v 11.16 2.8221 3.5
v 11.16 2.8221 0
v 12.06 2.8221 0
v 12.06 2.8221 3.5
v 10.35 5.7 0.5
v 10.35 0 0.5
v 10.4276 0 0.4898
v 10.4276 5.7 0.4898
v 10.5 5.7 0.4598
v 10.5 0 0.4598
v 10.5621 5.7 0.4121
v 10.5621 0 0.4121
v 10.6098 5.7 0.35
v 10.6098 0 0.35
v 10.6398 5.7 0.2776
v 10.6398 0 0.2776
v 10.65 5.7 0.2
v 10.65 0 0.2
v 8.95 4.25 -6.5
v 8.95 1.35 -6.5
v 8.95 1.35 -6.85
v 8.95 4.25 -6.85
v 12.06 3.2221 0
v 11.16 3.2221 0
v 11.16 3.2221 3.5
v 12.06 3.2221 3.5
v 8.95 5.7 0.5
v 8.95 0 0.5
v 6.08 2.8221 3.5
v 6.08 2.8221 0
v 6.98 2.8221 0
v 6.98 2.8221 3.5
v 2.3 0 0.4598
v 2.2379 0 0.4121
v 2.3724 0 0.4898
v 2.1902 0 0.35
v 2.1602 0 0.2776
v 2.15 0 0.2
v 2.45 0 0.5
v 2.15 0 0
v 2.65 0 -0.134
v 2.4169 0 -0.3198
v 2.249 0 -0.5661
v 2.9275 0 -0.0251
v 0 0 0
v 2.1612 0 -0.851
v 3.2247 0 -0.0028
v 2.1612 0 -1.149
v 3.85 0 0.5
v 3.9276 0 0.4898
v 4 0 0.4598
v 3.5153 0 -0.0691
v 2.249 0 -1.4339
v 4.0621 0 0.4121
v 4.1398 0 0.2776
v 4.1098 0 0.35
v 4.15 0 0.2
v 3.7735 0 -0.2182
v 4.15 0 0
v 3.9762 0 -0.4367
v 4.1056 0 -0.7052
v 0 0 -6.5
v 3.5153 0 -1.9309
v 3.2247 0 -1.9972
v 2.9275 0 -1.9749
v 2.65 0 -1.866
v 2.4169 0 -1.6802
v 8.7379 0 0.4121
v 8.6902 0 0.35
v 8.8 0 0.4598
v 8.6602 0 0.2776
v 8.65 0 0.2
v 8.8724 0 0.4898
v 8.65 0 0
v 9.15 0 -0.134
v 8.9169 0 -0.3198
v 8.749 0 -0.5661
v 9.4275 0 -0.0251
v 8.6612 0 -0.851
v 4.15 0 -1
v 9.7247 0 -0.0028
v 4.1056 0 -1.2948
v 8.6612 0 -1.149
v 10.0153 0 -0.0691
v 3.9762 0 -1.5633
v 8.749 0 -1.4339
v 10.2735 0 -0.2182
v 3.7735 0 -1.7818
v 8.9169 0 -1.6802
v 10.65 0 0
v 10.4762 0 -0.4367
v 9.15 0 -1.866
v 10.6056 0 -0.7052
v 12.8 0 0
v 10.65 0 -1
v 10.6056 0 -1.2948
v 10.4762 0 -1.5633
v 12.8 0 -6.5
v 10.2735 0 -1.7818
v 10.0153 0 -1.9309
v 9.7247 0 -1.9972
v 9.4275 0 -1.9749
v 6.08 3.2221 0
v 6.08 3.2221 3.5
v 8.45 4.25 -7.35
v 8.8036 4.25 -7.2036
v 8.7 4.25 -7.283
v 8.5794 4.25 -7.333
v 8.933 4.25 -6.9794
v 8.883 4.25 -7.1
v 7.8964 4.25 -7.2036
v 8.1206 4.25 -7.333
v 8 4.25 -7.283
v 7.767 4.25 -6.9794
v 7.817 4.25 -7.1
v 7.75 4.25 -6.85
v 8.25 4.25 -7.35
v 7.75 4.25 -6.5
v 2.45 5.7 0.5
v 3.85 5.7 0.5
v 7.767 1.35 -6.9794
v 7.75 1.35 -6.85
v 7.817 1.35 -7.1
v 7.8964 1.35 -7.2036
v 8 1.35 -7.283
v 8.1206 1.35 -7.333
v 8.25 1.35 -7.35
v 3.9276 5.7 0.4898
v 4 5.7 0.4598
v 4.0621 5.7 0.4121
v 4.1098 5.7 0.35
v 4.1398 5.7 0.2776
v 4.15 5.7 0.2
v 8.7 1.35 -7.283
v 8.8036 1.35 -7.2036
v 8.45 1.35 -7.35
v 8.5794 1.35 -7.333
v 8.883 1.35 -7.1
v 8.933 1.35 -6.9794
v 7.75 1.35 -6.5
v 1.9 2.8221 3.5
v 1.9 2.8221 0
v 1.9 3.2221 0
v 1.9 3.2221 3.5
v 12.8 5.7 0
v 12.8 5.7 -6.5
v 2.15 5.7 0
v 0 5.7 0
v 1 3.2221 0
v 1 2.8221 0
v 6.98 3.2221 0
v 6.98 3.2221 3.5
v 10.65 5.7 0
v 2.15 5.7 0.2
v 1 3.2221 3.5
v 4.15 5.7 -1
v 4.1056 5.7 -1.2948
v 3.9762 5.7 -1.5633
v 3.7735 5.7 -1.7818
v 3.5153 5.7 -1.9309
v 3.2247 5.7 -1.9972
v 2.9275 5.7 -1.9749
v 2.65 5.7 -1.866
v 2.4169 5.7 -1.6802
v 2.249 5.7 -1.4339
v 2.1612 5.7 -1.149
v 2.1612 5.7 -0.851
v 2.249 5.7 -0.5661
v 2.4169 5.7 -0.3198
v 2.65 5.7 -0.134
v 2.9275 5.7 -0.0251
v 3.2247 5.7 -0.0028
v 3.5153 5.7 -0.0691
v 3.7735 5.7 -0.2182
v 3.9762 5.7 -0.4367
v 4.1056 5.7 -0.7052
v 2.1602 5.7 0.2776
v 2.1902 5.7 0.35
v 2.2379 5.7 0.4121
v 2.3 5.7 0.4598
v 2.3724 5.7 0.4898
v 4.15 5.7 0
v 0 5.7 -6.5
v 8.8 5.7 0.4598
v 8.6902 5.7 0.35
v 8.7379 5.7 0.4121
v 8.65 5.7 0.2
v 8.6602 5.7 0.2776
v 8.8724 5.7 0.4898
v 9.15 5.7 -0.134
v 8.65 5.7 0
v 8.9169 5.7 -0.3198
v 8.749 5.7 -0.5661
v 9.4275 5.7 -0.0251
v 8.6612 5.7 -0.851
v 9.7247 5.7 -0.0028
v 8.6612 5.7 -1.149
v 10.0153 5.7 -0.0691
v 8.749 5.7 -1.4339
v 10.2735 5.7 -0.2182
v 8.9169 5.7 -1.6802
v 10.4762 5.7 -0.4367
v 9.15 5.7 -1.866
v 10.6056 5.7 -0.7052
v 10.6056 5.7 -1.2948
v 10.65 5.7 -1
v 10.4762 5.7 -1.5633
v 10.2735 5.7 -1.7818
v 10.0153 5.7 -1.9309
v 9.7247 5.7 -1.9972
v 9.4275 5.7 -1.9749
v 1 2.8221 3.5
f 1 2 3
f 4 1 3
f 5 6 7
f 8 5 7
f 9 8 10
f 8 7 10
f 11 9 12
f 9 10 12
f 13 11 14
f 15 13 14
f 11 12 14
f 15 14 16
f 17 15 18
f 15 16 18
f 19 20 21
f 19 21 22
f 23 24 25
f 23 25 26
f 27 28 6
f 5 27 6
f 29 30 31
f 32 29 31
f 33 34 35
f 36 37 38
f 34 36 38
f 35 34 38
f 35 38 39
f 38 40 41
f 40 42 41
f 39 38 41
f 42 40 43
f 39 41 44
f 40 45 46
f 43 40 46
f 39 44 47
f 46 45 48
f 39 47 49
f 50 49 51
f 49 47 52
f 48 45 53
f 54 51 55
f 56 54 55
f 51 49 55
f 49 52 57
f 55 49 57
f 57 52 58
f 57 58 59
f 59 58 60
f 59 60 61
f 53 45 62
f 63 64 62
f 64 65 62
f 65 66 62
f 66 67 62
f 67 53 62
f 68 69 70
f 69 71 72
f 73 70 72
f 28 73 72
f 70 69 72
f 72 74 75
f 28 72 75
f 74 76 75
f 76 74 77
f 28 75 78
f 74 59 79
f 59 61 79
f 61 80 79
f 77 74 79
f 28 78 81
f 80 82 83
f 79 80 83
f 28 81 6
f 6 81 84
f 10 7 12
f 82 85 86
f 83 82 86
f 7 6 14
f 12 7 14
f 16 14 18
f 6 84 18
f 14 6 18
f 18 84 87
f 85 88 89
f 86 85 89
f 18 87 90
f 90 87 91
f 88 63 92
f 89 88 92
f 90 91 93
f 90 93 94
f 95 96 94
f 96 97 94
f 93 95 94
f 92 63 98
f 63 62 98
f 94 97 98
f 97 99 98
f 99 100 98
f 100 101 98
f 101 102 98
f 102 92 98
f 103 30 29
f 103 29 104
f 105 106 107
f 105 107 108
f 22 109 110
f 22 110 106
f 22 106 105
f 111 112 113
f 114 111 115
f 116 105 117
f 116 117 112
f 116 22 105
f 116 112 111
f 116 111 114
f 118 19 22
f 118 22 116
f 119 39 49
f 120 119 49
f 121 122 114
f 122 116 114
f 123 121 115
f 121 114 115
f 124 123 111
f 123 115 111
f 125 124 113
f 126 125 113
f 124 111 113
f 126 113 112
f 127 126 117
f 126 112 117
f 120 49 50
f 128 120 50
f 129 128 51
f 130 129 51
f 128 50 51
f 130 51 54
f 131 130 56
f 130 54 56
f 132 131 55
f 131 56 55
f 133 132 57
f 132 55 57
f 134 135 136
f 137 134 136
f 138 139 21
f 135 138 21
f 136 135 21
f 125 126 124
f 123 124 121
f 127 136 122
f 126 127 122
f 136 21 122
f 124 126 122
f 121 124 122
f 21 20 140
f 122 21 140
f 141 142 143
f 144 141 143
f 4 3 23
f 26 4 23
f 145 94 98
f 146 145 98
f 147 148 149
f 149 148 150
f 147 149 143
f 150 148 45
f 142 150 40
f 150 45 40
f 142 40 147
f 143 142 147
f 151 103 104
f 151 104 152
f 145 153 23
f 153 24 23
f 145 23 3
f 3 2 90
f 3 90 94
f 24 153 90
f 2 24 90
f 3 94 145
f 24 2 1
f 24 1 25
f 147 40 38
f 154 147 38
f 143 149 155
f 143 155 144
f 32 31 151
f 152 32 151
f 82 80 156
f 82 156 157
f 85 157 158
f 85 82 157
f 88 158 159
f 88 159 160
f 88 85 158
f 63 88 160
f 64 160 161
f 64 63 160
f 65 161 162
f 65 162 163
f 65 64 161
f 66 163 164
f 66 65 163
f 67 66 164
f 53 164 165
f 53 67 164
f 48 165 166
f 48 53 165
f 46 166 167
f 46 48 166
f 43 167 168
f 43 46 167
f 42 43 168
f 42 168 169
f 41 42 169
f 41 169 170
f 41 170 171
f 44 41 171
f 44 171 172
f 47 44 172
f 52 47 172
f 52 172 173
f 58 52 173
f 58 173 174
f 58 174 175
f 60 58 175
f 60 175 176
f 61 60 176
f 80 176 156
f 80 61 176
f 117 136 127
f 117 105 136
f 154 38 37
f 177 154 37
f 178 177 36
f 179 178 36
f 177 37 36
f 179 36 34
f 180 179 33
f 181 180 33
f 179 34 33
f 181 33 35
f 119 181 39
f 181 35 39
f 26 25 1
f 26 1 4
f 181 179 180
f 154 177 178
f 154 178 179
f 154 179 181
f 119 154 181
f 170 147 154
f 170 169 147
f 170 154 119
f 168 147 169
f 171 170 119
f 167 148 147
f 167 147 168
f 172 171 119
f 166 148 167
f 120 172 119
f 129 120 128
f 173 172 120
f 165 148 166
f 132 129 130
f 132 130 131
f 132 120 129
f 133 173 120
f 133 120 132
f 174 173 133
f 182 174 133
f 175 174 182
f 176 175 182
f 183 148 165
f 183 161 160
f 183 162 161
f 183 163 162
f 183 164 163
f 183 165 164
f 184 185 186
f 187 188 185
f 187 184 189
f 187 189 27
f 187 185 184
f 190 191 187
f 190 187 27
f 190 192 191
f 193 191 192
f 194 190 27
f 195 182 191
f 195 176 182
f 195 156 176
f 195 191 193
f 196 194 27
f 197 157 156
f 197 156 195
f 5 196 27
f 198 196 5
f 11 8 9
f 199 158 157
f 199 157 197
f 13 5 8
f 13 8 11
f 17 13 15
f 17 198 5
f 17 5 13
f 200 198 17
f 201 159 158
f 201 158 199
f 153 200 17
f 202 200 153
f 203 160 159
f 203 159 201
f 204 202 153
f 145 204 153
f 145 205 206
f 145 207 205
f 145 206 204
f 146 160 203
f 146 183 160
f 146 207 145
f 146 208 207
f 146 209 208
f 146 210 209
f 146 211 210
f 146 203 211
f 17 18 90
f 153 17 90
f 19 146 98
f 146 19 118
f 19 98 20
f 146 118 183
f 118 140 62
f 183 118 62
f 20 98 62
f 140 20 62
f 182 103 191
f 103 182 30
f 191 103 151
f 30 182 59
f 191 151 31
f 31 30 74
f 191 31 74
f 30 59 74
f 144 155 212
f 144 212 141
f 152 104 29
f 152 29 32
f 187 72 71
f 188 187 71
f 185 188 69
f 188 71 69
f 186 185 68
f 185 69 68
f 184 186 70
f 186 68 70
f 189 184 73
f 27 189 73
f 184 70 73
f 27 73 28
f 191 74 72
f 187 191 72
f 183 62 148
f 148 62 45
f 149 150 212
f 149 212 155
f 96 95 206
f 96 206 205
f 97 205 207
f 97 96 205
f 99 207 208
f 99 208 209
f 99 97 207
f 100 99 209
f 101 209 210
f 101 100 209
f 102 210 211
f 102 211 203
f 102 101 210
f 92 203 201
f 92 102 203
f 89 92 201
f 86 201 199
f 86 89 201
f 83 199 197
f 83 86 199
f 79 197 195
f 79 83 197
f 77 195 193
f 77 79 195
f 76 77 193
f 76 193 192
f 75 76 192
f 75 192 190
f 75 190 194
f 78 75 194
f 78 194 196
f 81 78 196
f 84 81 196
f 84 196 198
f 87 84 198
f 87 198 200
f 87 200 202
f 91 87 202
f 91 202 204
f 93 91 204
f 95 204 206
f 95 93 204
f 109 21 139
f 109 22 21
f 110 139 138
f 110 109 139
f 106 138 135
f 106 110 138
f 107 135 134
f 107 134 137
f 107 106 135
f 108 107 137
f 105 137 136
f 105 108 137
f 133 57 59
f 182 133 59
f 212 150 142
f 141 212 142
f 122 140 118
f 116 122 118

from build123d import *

# Parameters (mm, degrees)
SKETCH1_R           = 1
BOSS_EXTRUDE1_DEPTH = 5.7
SKETCH2_W           = 1.2
SKETCH2_H           = 2.9
BOSS_EXTRUDE2_DEPTH = 0.85
FILLET1_R           = 0.5
SKETCH3_W           = 0.9
SKETCH3_H           = 0.4
BOSS_EXTRUDE3_DEPTH = 3.5


with BuildPart() as part:
    # Sketch1 → Boss-Extrude1 (new body)
    with BuildSketch(Plane(origin=(0, 0, 0), x_dir=(1, 0, 0), z_dir=(0, 1, 0))):
        with BuildLine():
            Line((0, 0), (2.15, 0))
            Line((2.15, 0), (2.15, -0.2))
            ThreePointArc((2.15, -0.2), (2.237867966, -0.412132034), (2.45, -0.5))
            Line((2.45, -0.5), (3.85, -0.5))
            ThreePointArc((3.85, -0.5), (4.062132034, -0.412132034), (4.15, -0.2))
            Line((4.15, -0.2), (4.15, 0))
            Line((4.15, 0), (8.65, 0))
            Line((8.65, 0), (8.65, -0.2))
            ThreePointArc((8.65, -0.2), (8.737867966, -0.412132034), (8.95, -0.5))
            Line((8.95, -0.5), (10.35, -0.5))
            ThreePointArc((10.35, -0.5), (10.562132034, -0.412132034), (10.65, -0.2))
            Line((10.65, -0.2), (10.65, 0))
            Line((10.65, 0), (12.8, 0))
            Line((12.8, 0), (12.8, 6.5))
            Line((12.8, 6.5), (0, 6.5))
            Line((0, 6.5), (0, 0))
        make_face()
        with Locations((3.15, 1)):
            Circle(SKETCH1_R, mode=Mode.SUBTRACT)
        with Locations((9.65, 1)):
            Circle(SKETCH1_R, mode=Mode.SUBTRACT)
    extrude(amount=BOSS_EXTRUDE1_DEPTH)

    # Sketch2 → Boss-Extrude2 (add)
    with BuildSketch(Plane(origin=(0, 0, -6.5), x_dir=(-1, 0, 0), z_dir=(0, 0, -1))):
        with Locations((-8.35, 2.8)):
            Rectangle(SKETCH2_W, SKETCH2_H)
    extrude(amount=BOSS_EXTRUDE2_DEPTH)

    # Fillet1
    fillet1_edges = [part.edges().sort_by_distance(p)[0] for p in [
        (8.95, 2.8, -7.35),
        (7.75, 2.8, -7.35),
    ]]
    fillet(fillet1_edges, radius=FILLET1_R)

    # Sketch3 → Boss-Extrude3 (add)
    with BuildSketch(Plane.XY):
        with Locations((1.45, 3.022147262)):
            Rectangle(SKETCH3_W, SKETCH3_H)
        with Locations((6.53, 3.022147262)):
            Rectangle(SKETCH3_W, SKETCH3_H)
        with Locations((11.61, 3.022147262)):
            Rectangle(SKETCH3_W, SKETCH3_H)
    extrude(amount=BOSS_EXTRUDE3_DEPTH)


solid = part.part
